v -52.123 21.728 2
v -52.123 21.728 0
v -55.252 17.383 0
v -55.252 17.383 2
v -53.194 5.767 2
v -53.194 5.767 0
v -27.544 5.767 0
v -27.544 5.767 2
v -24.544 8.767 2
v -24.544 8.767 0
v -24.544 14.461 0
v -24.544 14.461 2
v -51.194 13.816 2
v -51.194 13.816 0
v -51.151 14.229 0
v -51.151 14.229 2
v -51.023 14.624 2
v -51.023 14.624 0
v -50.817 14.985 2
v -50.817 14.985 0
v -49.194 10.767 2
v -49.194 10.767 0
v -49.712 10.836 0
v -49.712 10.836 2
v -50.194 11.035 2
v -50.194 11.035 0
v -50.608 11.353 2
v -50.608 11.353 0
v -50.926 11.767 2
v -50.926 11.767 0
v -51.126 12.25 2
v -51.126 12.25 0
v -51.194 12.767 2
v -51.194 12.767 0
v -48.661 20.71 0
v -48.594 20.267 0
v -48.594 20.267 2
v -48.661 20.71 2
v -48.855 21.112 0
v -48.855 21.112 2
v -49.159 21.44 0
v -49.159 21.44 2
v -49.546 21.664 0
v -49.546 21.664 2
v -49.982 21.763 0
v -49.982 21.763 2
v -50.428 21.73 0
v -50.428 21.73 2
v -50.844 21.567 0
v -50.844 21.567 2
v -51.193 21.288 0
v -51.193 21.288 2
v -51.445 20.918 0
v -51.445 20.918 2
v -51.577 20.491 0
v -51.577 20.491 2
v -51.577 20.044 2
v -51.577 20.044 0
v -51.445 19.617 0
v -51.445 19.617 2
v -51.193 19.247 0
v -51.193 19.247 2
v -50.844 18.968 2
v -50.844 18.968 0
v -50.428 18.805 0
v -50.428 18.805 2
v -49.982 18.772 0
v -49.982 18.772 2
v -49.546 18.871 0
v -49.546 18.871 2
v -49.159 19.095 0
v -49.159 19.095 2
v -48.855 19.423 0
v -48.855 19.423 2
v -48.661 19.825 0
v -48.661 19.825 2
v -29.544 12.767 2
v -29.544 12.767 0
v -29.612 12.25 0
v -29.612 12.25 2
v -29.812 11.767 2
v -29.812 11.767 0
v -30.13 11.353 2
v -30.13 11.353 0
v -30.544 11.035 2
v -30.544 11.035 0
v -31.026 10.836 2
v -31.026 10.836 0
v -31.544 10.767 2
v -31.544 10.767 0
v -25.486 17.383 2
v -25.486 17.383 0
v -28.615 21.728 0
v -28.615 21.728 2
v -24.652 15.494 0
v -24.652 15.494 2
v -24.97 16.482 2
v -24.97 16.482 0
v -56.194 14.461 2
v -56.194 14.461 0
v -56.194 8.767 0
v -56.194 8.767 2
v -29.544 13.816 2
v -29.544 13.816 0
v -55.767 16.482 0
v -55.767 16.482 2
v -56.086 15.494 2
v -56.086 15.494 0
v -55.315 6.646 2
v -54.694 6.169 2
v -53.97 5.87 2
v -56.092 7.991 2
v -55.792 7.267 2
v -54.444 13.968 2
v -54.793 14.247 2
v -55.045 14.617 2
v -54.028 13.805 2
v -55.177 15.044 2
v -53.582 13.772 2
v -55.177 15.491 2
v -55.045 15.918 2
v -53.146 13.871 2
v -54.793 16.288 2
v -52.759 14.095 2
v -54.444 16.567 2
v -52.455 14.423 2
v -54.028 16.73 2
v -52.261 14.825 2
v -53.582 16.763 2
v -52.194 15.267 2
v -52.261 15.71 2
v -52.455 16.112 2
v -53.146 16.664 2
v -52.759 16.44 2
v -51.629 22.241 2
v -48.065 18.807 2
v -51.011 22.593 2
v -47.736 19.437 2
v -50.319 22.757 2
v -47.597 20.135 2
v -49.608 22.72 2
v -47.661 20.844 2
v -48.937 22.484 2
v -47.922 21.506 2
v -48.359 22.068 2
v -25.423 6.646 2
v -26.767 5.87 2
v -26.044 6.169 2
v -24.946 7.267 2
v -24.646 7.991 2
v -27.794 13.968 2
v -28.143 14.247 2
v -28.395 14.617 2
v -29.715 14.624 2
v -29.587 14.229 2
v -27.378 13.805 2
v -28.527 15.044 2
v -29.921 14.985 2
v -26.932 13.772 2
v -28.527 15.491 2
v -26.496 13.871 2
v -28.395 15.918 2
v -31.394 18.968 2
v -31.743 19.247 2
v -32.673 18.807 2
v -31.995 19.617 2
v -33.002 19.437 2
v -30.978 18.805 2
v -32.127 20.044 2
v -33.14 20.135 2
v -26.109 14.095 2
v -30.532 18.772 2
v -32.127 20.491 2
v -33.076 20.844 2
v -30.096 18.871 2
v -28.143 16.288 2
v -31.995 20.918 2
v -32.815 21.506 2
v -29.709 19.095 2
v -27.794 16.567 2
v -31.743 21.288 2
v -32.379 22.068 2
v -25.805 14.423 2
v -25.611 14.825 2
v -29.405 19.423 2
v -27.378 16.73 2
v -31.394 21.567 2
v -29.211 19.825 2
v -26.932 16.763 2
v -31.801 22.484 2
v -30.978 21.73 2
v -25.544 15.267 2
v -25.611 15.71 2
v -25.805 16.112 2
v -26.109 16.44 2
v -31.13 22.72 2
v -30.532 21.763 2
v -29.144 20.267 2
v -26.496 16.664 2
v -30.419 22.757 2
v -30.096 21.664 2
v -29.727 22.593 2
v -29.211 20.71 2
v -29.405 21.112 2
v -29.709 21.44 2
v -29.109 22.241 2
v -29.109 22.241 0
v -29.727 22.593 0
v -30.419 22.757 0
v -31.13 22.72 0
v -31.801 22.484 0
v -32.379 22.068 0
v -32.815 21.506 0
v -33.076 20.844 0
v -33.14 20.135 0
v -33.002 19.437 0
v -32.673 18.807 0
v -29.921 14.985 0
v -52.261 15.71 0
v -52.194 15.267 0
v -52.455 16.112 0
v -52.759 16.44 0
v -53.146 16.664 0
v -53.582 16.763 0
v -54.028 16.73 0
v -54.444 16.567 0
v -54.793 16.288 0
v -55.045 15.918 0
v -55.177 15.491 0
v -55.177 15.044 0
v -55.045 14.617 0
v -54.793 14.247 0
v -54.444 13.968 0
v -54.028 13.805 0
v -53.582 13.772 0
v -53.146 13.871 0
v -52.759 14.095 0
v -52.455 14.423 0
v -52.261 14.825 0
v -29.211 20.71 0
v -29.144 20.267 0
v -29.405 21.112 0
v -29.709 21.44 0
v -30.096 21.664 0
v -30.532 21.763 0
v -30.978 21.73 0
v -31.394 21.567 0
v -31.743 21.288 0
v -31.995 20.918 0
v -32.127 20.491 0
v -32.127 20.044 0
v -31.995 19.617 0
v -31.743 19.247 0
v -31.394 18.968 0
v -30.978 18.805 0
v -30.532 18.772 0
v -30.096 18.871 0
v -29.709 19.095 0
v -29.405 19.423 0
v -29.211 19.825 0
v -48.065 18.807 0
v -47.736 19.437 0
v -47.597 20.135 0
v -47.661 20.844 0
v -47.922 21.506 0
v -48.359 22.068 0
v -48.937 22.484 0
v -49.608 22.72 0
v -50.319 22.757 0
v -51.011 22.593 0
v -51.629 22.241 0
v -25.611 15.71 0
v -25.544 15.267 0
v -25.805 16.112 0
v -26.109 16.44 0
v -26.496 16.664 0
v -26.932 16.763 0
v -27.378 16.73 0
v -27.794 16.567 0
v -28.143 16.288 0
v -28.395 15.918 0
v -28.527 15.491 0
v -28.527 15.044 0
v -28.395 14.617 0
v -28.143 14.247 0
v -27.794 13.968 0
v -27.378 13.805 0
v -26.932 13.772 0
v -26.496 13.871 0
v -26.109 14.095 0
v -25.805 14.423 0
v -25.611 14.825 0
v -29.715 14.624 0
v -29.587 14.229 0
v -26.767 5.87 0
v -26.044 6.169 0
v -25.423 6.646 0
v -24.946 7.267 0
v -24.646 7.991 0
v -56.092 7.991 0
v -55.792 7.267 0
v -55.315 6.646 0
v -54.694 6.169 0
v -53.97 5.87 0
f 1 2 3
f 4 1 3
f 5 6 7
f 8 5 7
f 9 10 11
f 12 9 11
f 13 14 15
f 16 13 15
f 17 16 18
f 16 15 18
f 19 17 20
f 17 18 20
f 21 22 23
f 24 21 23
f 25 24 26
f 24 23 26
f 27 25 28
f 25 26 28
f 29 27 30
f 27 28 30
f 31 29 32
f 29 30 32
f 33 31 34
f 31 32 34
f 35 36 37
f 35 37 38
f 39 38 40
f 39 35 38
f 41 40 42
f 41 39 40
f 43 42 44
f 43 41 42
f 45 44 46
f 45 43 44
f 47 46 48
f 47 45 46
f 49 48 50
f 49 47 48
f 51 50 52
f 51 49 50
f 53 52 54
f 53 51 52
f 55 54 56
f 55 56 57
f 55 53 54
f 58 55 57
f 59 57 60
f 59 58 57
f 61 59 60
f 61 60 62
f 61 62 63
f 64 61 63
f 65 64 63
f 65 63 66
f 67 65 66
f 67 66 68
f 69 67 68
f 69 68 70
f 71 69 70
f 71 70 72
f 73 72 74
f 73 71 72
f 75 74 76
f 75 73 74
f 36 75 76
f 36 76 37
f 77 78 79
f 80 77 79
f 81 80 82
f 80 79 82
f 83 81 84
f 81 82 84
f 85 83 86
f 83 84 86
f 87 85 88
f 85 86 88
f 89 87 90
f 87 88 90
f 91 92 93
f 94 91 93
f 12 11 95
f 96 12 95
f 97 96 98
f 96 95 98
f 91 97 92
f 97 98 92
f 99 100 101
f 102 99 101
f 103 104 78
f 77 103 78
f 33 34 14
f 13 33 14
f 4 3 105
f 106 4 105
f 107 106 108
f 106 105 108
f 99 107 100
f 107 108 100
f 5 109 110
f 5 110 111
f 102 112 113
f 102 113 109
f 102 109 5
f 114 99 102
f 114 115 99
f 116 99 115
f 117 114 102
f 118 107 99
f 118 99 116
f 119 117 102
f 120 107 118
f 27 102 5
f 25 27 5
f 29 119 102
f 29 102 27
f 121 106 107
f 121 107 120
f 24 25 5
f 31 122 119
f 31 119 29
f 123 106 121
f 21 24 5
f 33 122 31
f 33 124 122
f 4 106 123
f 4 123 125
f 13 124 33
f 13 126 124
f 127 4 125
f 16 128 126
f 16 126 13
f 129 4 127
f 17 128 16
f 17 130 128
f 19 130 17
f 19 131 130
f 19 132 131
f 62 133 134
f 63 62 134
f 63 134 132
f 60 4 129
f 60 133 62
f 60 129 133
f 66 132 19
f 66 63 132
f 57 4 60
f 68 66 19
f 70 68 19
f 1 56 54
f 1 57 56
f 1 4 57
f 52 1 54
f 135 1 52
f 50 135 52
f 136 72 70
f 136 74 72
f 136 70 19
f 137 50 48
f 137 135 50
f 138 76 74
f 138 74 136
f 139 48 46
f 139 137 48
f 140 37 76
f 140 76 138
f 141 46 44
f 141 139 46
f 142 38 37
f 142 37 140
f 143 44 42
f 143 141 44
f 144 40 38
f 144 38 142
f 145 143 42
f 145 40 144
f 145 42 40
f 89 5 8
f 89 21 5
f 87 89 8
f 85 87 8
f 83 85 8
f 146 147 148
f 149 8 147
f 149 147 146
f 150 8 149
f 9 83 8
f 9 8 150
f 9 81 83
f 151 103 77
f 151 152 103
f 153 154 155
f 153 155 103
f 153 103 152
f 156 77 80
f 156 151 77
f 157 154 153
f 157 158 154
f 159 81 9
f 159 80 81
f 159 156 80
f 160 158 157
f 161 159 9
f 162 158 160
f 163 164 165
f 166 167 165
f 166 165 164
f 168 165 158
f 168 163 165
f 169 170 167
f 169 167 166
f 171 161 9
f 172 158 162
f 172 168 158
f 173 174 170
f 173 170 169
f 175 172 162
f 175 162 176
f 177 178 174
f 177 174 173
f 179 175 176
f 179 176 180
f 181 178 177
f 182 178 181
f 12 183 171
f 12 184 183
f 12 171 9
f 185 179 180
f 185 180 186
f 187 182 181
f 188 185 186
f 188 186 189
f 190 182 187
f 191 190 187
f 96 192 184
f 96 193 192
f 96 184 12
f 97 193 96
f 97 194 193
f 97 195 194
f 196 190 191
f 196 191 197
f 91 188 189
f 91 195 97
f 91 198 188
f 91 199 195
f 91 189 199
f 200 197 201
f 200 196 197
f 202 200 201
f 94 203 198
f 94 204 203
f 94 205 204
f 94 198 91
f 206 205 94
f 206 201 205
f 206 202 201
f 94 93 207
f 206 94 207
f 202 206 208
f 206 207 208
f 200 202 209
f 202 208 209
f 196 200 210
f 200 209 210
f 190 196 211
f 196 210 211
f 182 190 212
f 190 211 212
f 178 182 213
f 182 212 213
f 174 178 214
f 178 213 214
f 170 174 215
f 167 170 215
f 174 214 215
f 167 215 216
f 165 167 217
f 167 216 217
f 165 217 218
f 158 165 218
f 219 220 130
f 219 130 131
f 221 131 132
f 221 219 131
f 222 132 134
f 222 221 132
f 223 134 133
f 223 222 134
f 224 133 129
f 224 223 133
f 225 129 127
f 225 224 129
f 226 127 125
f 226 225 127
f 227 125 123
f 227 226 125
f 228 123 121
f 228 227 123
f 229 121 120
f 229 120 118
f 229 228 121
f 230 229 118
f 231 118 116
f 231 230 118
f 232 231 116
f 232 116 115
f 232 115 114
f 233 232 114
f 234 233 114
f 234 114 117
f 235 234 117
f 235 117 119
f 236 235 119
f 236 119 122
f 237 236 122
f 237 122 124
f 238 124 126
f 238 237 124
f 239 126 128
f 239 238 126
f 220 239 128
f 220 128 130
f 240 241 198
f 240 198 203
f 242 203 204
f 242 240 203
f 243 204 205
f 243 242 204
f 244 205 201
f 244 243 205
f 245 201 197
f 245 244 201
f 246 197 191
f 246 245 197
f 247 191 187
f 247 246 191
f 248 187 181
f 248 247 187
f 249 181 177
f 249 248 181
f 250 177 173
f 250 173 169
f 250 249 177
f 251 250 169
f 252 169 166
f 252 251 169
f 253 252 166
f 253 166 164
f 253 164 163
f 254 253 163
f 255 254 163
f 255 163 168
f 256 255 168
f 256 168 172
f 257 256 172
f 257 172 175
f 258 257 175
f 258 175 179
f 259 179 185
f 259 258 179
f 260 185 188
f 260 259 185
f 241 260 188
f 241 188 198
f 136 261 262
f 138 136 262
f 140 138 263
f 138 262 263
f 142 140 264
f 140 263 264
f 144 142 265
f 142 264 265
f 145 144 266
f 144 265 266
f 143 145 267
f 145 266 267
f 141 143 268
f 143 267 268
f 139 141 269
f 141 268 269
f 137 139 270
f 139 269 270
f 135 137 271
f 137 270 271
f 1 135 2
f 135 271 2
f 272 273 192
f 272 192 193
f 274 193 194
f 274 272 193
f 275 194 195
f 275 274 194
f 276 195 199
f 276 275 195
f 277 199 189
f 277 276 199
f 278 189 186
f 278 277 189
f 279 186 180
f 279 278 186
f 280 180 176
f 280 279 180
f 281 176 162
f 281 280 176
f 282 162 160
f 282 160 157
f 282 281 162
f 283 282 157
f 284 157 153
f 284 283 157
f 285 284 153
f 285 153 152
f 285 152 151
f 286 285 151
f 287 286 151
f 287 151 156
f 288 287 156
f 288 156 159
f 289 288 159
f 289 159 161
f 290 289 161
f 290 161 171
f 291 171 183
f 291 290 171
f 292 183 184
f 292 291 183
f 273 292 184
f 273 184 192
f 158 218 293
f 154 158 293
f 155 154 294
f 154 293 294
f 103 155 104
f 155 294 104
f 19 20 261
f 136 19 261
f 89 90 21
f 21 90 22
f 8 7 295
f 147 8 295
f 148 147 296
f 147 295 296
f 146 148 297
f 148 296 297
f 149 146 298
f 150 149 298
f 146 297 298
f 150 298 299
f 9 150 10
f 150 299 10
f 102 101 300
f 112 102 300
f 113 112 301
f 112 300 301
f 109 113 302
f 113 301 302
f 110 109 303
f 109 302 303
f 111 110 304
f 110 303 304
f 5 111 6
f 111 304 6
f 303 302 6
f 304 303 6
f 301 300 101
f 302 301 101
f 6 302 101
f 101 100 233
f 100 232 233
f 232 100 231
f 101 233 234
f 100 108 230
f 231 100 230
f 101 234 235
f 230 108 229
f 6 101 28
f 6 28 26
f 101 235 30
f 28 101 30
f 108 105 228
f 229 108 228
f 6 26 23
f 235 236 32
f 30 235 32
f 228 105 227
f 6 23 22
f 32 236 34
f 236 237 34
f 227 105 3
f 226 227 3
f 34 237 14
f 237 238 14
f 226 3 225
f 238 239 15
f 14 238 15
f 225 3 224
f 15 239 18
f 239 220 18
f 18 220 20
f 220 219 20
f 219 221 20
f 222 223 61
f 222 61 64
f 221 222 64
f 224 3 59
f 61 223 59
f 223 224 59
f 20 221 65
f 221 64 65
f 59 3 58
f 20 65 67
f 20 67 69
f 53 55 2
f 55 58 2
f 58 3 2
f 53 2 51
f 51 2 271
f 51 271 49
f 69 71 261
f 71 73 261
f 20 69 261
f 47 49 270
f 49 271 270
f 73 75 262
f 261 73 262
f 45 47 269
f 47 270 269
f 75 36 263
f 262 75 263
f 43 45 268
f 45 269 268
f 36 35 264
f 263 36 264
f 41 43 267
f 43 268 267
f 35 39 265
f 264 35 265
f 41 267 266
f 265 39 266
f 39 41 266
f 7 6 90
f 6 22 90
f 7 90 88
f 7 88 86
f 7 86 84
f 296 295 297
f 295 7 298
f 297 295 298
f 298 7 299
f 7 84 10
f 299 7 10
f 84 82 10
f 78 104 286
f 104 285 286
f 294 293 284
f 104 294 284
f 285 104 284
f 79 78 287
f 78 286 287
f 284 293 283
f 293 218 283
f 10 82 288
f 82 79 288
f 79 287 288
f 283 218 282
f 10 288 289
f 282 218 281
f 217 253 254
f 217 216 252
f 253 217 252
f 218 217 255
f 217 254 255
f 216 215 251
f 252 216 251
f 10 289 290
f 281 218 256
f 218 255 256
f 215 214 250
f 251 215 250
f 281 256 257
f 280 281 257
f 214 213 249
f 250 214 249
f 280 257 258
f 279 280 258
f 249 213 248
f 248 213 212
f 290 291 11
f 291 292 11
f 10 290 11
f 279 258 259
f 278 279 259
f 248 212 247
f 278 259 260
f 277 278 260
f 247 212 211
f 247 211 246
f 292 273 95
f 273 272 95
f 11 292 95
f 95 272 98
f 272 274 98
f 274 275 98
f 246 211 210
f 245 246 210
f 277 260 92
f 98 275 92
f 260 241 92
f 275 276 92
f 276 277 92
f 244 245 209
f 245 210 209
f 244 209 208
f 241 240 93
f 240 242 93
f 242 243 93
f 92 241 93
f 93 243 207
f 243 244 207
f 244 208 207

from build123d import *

# Parameters (mm, degrees)
F0_R     = 1.5
F1_DEPTH = 2


with BuildPart() as f1:
    # F0 (on Top) → F1 (new body)
    with BuildSketch(Plane.XY):
        with BuildLine():
            ThreePointArc((-56.193922, 8.767486), (-55.315242, 6.646166), (-53.193922, 5.767486))
            Line((-53.193922, 5.767486), (-27.543922, 5.767486))
            ThreePointArc((-27.543922, 5.767486), (-25.422601, 6.646166), (-24.543922, 8.767486))
            Line((-24.543922, 8.767486), (-24.543922, 14.461119))
            ThreePointArc((-24.543922, 14.461119), (-24.785332, 15.995987), (-25.48625, 17.382643))
            Line((-25.48625, 17.382643), (-28.615086, 21.728248))
            ThreePointArc((-28.615086, 21.728248), (-32.104684, 22.296322), (-32.672758, 18.806724))
            Line((-32.672758, 18.806724), (-29.920853, 14.984635))
            ThreePointArc((-29.920853, 14.984635), (-29.640486, 14.429972), (-29.543922, 13.816025))
            Line((-29.543922, 13.816025), (-29.543922, 12.767486))
            ThreePointArc((-29.543922, 12.767486), (-30.129708, 11.353272), (-31.543922, 10.767486))
            Line((-31.543922, 10.767486), (-49.193922, 10.767486))
            ThreePointArc((-49.193922, 10.767486), (-50.608135, 11.353272), (-51.193922, 12.767486))
            Line((-51.193922, 12.767486), (-51.193922, 13.816024))
            ThreePointArc((-51.193922, 13.816024), (-51.097358, 14.429971), (-50.81699, 14.984633))
            Line((-50.81699, 14.984633), (-48.065085, 18.806724))
            ThreePointArc((-48.065085, 18.806724), (-48.633159, 22.296322), (-52.122757, 21.728248))
            Line((-52.122757, 21.728248), (-55.251593, 17.382643))
            ThreePointArc((-55.251593, 17.382643), (-55.952512, 15.995987), (-56.193922, 14.461119))
            Line((-56.193922, 14.461119), (-56.193922, 8.767486))
        make_face()
        with Locations((-53.693922, 15.267486)):
            Circle(F0_R, mode=Mode.SUBTRACT)
        with Locations((-50.093921, 20.267486)):
            Circle(F0_R, mode=Mode.SUBTRACT)
        with Locations((-27.043922, 15.267486)):
            Circle(F0_R, mode=Mode.SUBTRACT)
        with Locations((-30.643922, 20.267486)):
            Circle(F0_R, mode=Mode.SUBTRACT)
    extrude(amount=F1_DEPTH)


solid = f1.part
